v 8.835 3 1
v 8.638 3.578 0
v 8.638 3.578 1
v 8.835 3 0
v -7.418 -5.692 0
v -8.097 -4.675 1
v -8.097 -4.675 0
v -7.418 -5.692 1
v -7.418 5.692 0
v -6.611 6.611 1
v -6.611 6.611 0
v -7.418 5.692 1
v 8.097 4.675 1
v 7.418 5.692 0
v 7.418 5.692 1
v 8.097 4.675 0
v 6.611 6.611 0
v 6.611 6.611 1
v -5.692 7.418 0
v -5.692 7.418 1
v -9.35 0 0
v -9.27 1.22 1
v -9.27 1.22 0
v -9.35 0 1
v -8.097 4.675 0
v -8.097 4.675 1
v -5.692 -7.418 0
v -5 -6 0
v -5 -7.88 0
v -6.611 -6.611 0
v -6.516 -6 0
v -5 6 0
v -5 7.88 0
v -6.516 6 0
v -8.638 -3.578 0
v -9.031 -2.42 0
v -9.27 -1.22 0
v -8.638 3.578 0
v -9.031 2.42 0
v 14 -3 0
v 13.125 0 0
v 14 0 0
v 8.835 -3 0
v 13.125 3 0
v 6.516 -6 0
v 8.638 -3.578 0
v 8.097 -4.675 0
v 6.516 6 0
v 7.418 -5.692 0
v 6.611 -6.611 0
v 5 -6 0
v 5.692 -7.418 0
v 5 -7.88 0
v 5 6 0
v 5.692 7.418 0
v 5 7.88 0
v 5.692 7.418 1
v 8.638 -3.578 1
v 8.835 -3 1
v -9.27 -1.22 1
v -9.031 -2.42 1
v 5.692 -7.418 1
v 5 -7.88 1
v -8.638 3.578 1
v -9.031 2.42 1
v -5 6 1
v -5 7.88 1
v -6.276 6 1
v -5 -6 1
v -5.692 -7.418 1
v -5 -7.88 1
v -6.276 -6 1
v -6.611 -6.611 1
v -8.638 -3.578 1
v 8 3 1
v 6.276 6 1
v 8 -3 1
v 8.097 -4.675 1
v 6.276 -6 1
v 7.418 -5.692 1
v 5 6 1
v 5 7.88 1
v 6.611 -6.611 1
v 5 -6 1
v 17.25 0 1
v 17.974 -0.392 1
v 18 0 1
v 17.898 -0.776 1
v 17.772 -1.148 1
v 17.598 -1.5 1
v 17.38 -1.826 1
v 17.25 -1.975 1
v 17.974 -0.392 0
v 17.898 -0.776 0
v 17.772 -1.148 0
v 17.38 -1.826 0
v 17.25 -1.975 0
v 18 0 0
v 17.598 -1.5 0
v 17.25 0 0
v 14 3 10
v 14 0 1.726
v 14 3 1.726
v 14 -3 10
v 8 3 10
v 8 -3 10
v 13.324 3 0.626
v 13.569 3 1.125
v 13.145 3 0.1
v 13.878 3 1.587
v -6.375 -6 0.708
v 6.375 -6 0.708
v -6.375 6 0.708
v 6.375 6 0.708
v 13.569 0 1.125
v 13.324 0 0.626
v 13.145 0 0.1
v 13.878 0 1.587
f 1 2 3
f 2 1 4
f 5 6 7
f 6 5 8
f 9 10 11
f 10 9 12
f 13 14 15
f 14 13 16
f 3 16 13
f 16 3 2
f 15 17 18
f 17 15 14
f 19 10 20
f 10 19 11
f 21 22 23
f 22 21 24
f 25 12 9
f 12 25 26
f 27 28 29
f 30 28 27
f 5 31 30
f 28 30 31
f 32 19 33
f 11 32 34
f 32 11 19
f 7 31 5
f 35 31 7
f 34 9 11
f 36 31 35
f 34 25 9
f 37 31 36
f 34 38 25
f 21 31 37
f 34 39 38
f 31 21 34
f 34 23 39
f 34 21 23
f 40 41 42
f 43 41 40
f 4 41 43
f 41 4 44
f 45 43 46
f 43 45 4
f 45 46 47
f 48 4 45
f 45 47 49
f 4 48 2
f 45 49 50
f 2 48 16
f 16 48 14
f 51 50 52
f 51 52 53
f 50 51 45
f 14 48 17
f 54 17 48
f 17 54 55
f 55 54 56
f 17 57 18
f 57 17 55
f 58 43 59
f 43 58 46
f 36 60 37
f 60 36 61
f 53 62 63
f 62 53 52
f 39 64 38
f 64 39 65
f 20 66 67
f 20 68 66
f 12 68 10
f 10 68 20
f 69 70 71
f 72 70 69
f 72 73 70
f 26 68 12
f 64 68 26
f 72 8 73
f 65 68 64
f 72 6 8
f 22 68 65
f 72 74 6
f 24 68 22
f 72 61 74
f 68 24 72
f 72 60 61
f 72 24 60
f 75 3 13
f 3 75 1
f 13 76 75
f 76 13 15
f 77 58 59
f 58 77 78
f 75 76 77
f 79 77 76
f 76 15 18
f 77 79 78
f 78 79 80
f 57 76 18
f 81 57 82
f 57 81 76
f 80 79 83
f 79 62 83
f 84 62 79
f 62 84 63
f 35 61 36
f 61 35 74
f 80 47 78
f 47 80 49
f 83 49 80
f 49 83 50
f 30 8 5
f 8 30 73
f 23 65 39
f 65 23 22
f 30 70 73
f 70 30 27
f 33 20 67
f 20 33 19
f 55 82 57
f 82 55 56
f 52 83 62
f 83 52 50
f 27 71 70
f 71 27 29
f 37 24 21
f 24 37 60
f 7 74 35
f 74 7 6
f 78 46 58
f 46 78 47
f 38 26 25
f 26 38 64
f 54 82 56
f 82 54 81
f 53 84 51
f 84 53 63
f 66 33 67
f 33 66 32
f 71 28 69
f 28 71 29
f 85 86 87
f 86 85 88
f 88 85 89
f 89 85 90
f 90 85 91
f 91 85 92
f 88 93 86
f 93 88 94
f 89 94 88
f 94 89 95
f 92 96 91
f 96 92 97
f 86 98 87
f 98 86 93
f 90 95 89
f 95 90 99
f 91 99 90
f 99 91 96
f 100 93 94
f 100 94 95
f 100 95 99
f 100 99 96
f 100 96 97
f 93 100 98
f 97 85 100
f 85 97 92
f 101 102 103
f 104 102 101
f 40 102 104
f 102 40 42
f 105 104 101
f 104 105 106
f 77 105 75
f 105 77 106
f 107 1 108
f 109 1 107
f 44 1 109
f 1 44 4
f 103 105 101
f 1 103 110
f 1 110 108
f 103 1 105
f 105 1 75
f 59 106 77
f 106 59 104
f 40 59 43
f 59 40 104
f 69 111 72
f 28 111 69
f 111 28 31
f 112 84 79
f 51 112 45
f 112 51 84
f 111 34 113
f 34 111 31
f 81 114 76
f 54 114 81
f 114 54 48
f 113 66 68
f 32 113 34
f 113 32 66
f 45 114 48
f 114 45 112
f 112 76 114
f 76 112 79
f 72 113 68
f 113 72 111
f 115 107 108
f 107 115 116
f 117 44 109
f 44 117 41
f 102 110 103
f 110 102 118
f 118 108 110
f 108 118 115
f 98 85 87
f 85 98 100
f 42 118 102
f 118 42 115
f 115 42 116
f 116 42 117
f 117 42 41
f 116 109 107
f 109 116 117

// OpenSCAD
// Stand-off clip - a ring that snaps onto a round stand rod, with a separate ring for a
// piece of tubing, joined by a bridge. Printed flat (an extruded 2-D profile): the two rings
// do not touch the bed until they are assembled onto a stand, so they are not warped by the print.
// NOVEL general part.
//

stand_d  = 12.7;
tube_d   = 6;
bridge_w = 6;
height   = 10;

$fn = 48;

ring_d = stand_d + 2 * 3;          // outer diameter of the stand ring
open   = 10;                       // opening in the stand ring (-X side)
g      = stand_d + 0.5;            // approach the stand with a clearance

open_t = 4.5;                      // opening in the tubing ring (+X side)

difference() {
    union() {
        ring(stand_d + 2 * 3, 3, open);                 // stand ring
        ring(tube_d, 2, open_t, x = 15);                 // tubing ring
        translate([8, -3, 0]) cube([bridge_w, 6, height]);   // bridge
    }
    translate([0, -6, -1]) rotate([-90, 0, 0]) cylinder(h = height + 2, d = g);      // stand rod
    translate([15 + open_t / 2, 0, -1]) rotate([-90, 0, 0]) cylinder(h = height + 2, d = open_t + 4);   // tubing opening
}

// Ring: a circle with a rectangular opening cut out of the +X side, for a panel or a stand rod.
module ring(od, wall, opening, x = 0) {
    inner = od - 2 * wall;
    translate([x, 0, 0]) difference() {
        cylinder(h = 1, d = od);
        translate([-opening / 2, -od / 2 - 1, 0]) cube([opening, od + 4, 1]);
    }
}
